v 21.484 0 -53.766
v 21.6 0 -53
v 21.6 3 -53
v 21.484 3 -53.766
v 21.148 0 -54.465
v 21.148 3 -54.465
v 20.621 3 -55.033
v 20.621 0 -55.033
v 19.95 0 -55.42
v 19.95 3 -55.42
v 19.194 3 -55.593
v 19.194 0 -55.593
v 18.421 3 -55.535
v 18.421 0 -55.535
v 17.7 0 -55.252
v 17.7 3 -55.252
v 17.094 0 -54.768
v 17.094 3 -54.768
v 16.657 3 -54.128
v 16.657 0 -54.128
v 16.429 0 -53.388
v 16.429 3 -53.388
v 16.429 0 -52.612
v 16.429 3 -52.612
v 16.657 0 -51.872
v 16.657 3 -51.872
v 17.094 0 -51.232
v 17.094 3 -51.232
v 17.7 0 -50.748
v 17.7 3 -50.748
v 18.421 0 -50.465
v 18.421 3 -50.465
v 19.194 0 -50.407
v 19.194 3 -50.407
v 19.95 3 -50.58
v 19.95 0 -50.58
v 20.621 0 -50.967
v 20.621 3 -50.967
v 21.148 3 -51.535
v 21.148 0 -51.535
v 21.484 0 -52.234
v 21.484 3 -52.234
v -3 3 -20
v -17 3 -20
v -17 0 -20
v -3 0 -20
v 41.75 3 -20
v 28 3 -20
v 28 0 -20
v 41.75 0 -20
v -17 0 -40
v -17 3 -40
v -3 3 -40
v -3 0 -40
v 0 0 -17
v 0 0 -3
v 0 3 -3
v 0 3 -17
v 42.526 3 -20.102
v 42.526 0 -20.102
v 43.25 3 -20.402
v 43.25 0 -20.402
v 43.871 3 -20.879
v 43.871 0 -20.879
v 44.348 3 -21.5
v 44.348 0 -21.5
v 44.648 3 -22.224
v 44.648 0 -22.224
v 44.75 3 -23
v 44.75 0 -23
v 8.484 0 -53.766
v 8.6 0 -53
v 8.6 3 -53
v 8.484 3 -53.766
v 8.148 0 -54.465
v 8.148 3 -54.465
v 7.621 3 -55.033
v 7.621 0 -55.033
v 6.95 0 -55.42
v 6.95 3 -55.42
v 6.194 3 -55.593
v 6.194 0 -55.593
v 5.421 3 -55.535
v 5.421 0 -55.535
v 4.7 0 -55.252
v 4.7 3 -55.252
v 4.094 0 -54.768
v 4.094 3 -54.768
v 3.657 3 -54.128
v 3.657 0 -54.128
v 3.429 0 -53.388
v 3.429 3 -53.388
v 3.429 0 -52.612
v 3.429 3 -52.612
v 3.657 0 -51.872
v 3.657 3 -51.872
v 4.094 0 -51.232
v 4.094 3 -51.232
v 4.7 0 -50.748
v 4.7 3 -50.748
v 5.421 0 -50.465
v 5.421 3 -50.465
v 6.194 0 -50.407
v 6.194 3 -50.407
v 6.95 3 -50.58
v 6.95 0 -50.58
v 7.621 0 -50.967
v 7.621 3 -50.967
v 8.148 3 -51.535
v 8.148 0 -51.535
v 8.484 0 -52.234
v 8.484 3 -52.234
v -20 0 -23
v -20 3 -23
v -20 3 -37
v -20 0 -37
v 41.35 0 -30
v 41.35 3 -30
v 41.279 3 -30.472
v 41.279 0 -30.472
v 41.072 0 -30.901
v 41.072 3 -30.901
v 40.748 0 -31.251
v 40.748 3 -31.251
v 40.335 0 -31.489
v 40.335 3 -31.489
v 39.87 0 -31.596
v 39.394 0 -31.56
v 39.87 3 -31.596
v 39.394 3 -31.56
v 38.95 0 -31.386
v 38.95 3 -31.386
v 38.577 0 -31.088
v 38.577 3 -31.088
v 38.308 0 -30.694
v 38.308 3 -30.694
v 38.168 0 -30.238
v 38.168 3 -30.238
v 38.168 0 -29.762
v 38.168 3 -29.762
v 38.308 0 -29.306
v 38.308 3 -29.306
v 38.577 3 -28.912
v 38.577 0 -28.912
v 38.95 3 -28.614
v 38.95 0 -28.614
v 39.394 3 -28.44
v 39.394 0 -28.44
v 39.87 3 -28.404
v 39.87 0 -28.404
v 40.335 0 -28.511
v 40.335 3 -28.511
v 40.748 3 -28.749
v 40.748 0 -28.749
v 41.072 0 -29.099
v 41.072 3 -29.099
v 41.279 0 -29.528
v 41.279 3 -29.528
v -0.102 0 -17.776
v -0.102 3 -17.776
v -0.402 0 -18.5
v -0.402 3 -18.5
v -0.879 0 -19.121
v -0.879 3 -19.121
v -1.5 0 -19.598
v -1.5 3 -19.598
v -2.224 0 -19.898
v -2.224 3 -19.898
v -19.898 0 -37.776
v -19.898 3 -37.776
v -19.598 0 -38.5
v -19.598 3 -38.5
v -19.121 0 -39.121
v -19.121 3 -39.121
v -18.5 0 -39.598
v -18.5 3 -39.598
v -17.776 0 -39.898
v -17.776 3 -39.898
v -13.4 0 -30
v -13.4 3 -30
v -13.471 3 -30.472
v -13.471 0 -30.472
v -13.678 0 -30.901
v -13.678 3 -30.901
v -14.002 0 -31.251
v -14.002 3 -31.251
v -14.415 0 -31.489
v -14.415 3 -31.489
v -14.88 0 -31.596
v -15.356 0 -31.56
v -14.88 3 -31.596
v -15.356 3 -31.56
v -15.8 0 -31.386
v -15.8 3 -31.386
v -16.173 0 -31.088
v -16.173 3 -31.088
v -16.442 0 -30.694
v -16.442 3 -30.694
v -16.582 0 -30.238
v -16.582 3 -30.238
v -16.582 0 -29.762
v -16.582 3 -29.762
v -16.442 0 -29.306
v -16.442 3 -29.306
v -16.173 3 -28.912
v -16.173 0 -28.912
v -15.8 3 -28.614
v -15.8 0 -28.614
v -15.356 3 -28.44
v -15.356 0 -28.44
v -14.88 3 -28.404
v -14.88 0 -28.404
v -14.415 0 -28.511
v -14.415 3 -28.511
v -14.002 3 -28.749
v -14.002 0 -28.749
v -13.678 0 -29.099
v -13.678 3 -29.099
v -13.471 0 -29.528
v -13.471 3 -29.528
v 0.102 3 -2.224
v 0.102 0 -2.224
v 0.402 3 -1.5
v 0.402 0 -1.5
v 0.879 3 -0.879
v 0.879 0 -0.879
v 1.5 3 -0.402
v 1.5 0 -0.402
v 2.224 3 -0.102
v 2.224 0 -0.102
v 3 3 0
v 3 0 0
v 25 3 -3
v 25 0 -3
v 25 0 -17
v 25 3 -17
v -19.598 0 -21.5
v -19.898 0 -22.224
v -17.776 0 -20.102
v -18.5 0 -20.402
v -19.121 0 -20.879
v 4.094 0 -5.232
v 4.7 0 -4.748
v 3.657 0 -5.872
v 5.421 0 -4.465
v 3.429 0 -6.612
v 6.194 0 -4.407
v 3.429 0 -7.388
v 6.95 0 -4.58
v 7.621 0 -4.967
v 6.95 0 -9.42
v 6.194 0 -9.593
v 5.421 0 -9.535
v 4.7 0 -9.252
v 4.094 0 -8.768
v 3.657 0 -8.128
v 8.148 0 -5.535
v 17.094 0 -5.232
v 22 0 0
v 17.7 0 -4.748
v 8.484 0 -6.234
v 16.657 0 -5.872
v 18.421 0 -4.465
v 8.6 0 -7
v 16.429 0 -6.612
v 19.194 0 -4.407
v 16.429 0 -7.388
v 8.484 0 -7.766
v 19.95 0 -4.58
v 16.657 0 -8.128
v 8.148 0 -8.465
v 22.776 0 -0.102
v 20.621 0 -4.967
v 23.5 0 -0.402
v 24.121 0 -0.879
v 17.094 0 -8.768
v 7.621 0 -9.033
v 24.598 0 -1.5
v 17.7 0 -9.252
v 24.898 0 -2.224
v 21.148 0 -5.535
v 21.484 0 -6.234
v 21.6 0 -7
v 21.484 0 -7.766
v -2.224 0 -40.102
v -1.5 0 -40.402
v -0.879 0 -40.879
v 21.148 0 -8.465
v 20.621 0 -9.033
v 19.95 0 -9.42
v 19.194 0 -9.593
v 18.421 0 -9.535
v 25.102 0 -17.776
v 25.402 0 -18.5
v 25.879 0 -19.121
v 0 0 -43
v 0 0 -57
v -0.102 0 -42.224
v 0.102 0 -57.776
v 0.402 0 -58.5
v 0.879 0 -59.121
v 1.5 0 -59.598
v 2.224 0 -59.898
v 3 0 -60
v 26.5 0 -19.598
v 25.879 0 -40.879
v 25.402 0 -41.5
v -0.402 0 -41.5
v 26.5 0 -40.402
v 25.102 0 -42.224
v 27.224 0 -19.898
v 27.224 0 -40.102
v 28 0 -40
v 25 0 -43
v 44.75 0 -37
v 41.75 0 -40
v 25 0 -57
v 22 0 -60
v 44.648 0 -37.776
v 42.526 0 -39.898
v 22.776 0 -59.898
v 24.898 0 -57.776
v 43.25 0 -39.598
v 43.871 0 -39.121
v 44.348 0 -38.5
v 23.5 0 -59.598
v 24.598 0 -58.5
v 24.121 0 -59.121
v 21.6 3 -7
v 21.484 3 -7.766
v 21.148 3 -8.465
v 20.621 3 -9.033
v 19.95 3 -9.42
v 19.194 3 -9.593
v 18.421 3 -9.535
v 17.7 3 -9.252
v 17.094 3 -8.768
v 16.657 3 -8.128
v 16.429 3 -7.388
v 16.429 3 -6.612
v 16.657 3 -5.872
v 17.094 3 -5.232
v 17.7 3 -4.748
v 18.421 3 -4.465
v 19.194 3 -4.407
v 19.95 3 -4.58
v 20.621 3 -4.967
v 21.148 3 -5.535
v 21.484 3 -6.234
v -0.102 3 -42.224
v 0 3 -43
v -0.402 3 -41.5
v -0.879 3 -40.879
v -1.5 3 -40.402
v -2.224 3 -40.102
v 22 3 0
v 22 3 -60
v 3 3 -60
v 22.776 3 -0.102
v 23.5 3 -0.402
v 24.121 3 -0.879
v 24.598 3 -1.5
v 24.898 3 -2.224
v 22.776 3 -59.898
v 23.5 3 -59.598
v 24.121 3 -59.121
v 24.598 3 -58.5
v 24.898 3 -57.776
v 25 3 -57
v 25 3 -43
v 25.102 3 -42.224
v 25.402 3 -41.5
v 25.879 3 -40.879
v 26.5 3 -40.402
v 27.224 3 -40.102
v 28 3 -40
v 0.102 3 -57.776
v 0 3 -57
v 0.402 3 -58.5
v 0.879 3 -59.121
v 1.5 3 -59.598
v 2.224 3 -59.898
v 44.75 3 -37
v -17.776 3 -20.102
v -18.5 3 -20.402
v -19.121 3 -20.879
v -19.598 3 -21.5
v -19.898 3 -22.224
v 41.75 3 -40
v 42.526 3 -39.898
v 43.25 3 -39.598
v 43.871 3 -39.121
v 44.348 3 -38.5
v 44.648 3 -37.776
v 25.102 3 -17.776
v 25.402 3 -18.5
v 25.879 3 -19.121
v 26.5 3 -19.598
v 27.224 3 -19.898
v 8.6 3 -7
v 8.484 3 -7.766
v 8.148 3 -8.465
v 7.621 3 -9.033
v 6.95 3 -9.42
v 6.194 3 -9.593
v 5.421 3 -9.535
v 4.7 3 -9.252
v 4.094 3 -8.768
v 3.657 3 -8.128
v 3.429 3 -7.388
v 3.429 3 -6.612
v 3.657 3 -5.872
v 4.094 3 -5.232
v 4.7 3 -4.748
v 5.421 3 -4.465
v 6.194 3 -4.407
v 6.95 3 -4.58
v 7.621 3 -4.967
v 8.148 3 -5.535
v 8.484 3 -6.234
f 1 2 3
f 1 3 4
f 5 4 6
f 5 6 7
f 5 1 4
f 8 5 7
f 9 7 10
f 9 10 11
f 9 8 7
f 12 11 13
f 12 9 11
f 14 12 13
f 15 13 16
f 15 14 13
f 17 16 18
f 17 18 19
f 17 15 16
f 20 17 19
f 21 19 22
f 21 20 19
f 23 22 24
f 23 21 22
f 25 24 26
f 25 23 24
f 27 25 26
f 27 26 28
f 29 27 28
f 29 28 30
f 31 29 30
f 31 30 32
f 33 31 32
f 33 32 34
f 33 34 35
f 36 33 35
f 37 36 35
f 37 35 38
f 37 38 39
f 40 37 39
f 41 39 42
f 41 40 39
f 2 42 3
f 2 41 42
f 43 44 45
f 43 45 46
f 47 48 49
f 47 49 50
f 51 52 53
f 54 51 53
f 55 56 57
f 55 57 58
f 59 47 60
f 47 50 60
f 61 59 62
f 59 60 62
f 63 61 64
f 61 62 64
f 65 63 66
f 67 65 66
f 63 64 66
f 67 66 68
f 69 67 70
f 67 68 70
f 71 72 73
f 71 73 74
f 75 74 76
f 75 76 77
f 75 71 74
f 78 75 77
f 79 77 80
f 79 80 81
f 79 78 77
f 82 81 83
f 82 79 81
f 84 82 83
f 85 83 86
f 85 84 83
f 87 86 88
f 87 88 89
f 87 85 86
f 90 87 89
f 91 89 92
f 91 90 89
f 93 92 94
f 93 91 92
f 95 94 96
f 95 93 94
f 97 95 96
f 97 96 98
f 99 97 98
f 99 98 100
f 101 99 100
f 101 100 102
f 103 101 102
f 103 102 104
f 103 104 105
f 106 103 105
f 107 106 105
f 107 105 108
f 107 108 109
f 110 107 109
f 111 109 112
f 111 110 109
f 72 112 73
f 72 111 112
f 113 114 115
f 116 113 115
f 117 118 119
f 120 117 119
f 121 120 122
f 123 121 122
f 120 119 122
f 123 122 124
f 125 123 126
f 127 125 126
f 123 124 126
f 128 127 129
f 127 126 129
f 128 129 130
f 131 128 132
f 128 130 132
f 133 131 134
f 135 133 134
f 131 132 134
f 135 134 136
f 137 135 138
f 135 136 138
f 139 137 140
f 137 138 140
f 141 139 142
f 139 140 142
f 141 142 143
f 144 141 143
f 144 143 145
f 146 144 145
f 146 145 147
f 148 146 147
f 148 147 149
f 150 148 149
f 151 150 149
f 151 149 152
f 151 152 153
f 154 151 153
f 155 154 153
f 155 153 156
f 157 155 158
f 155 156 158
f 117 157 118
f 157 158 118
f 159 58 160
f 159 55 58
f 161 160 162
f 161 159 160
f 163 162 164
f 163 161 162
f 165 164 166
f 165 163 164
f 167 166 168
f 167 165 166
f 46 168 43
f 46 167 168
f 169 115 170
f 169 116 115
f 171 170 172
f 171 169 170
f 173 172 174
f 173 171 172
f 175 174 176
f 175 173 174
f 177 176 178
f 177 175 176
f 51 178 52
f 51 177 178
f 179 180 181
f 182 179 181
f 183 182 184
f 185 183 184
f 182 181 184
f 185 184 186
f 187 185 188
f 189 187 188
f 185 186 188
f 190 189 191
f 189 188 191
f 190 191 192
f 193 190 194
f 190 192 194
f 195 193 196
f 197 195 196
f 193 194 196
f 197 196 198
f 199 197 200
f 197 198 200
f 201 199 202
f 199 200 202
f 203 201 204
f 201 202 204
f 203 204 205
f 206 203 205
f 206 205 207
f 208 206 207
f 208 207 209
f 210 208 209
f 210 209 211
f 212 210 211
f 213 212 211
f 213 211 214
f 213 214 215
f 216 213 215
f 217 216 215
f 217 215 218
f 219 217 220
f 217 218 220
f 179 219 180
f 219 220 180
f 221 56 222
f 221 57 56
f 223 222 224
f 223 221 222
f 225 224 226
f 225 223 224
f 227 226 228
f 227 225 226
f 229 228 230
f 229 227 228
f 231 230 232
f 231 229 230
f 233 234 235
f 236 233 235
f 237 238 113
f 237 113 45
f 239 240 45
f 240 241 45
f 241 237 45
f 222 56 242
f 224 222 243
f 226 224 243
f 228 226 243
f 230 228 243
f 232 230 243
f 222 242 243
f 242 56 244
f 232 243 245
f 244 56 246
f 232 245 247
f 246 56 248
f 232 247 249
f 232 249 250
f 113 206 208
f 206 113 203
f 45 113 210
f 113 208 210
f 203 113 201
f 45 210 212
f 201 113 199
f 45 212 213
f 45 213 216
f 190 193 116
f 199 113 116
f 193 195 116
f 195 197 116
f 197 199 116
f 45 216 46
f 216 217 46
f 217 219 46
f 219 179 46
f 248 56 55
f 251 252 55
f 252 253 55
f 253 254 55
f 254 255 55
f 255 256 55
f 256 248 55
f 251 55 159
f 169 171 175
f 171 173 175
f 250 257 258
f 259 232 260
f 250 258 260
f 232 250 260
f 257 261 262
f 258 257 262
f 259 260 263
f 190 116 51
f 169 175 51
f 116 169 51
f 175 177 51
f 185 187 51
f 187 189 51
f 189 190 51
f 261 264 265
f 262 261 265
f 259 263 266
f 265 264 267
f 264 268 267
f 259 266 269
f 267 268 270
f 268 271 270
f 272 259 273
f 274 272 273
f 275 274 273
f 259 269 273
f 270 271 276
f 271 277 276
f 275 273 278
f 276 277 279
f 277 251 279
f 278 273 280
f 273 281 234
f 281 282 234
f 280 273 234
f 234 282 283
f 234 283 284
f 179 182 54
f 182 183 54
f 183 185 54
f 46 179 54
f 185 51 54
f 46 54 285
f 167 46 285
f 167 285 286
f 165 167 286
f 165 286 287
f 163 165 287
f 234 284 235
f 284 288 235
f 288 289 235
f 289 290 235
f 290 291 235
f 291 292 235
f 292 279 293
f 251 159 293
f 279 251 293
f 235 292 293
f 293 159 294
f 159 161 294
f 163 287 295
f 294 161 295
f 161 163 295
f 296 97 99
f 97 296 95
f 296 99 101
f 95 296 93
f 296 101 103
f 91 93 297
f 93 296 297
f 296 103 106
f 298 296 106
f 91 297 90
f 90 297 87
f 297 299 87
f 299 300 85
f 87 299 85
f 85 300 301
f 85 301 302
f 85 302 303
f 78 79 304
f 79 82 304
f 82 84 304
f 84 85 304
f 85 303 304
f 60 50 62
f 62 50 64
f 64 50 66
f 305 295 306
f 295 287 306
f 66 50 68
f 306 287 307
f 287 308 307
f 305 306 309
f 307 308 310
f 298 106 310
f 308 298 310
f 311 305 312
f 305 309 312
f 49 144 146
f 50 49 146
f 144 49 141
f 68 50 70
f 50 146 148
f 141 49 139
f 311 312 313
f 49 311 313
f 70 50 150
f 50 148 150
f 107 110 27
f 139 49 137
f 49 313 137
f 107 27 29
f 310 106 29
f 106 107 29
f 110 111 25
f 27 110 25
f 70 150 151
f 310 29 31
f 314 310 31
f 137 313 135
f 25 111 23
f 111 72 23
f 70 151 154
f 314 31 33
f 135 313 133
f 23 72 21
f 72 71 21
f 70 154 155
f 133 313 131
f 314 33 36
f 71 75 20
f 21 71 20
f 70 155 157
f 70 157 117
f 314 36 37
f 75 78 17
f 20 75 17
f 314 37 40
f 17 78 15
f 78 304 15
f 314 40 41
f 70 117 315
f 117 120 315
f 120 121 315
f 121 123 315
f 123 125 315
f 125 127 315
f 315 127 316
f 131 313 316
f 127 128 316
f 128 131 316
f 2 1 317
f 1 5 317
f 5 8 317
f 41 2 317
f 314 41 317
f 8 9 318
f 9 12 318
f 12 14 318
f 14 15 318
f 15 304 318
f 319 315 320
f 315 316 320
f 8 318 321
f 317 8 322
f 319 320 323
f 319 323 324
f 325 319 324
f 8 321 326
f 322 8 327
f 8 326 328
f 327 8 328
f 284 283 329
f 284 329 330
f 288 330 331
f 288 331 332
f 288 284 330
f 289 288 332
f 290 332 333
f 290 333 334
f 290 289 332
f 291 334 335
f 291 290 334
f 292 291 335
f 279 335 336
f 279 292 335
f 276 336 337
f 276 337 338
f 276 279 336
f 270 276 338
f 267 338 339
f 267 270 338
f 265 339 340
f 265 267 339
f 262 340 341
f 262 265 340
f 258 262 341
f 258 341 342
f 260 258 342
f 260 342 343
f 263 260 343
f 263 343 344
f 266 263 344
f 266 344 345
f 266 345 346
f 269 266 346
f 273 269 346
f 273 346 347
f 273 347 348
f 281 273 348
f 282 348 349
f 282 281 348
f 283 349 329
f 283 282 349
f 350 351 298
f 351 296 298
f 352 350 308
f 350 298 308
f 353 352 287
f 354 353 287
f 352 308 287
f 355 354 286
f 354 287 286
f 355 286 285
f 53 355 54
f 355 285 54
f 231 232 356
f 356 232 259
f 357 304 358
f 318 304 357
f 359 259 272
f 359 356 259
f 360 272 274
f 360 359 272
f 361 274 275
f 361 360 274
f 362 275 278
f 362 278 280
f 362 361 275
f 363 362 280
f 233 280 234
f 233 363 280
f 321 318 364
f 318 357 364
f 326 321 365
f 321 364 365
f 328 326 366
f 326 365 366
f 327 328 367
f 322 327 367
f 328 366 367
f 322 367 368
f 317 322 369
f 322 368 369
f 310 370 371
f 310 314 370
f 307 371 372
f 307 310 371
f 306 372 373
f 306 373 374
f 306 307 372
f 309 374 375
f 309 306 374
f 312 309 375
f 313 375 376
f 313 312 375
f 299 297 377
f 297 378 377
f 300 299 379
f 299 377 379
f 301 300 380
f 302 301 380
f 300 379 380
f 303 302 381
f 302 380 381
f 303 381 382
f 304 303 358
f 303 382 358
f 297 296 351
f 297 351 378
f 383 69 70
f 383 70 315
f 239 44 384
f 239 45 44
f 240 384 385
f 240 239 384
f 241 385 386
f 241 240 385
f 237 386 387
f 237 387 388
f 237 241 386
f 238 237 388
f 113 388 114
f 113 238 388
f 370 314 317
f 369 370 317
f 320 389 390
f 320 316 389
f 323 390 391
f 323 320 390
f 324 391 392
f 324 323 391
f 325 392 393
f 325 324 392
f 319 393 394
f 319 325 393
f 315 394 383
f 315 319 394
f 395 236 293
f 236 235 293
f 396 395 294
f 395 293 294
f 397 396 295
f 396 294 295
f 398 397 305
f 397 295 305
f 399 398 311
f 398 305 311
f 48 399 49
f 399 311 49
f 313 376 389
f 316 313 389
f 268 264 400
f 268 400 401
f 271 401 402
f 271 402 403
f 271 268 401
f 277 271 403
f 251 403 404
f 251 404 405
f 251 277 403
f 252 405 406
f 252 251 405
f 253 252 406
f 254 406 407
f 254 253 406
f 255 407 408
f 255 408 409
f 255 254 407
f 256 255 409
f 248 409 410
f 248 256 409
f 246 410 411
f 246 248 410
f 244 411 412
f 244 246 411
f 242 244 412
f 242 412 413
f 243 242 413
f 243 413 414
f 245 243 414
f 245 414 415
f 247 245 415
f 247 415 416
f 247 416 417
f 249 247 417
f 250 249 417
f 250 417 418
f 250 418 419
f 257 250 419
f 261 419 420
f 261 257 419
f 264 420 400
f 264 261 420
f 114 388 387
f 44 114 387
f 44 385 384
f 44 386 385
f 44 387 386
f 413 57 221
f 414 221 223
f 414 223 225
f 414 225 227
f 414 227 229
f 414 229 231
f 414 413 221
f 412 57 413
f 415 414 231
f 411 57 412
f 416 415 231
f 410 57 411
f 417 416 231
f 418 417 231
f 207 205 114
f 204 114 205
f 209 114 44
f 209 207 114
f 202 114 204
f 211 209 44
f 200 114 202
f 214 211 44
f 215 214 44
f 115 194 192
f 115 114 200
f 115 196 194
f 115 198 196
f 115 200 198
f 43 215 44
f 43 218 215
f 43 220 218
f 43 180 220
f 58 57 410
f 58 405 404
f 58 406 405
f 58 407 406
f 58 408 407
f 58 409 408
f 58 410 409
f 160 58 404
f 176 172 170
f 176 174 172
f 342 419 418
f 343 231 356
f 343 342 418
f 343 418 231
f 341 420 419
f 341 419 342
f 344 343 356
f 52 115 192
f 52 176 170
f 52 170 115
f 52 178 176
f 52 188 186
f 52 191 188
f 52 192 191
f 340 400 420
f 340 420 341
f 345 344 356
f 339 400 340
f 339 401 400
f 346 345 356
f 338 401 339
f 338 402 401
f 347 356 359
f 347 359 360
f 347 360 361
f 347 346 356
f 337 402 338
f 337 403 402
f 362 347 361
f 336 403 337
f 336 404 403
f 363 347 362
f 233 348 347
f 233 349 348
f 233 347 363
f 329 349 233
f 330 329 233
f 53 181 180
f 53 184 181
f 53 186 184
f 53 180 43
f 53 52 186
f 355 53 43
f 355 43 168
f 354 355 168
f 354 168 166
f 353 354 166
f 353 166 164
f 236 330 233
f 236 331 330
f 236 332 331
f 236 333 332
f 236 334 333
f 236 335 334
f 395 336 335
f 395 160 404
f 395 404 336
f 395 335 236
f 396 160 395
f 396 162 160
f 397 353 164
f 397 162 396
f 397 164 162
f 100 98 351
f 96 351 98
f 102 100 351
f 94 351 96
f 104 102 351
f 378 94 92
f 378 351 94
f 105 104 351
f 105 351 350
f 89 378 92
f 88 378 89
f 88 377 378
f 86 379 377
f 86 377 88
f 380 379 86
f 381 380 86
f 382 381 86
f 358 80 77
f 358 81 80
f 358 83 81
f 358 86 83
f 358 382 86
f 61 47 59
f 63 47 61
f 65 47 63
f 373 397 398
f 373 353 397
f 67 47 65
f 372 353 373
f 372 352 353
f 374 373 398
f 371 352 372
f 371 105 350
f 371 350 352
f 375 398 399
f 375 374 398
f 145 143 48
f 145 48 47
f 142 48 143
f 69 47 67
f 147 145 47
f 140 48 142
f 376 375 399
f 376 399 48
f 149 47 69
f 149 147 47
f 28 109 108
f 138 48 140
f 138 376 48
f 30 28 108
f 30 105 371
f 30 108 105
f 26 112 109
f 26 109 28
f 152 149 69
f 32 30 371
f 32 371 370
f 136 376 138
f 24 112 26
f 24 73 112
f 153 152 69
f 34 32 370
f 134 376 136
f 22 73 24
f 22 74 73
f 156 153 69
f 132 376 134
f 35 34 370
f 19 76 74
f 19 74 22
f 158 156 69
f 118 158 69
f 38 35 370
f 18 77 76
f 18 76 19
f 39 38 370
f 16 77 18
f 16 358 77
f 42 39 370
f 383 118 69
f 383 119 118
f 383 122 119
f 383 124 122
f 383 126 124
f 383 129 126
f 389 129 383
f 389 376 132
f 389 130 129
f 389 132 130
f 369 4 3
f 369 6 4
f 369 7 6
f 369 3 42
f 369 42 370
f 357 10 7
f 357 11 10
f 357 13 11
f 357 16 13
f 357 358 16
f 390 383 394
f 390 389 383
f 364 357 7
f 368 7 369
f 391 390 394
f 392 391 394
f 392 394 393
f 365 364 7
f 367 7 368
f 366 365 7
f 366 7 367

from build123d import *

# Parameters (mm, degrees)
SKETCH_1_W      = 25
SKETCH_1_H      = 60
SKETCH_1_R      = 2.6
EXTRUDE_1_DEPTH = 3
SKETCH_2_W      = 20
SKETCH_2_H      = 20
SKETCH_2_R      = 1.6
SKETCH_2_W_2    = 19.75
EXTRUDE_2_DEPTH = 3
FILLET_1_R      = 3


with BuildPart() as part:
    # 草图1 → 凸台-拉伸1 (new body)
    with BuildSketch(Plane(origin=(0, 0, 0), x_dir=(1, 0, 0), z_dir=(0, 1, 0))):
        with Locations((12.5, 30)):
            Rectangle(SKETCH_1_W, SKETCH_1_H)
        with Locations((6, 7)):
            Circle(SKETCH_1_R, mode=Mode.SUBTRACT)
        with Locations((19, 7)):
            Circle(SKETCH_1_R, mode=Mode.SUBTRACT)
        with Locations((6, 53)):
            Circle(SKETCH_1_R, mode=Mode.SUBTRACT)
        with Locations((19, 53)):
            Circle(SKETCH_1_R, mode=Mode.SUBTRACT)
    extrude(amount=EXTRUDE_1_DEPTH)

    # 草图2 → 凸台-拉伸2 (add)
    with BuildSketch(Plane(origin=(0, 3, 0), x_dir=(1, 0, 0), z_dir=(0, 1, 0))):
        with Locations((-10, 30)):
            Rectangle(SKETCH_2_W, SKETCH_2_H)
        with Locations((-15, 30)):
            Circle(SKETCH_2_R, mode=Mode.SUBTRACT)
        with Locations((34.875, 30)):
            Rectangle(SKETCH_2_W_2, SKETCH_2_H)
        with Locations((39.75, 30)):
            Circle(SKETCH_2_R, mode=Mode.SUBTRACT)
    extrude(amount=-EXTRUDE_2_DEPTH)

    # 圆角1
    fillet_1_edges = [part.edges().sort_by_distance(p)[0] for p in [
        (0, 1.5, -40),
        (0, 1.5, -20),
        (-20, 1.5, -20),
        (-20, 1.5, -40),
        (25, 1.5, -20),
        (25, 1.5, -40),
        (44.75, 1.5, -40),
        (44.75, 1.5, -20),
        (0, 1.5, -60),
        (25, 1.5, -60),
        (25, 1.5, 0),
        (0, 1.5, 0),
    ]]
    fillet(fillet_1_edges, radius=FILLET_1_R)


solid = part.part
